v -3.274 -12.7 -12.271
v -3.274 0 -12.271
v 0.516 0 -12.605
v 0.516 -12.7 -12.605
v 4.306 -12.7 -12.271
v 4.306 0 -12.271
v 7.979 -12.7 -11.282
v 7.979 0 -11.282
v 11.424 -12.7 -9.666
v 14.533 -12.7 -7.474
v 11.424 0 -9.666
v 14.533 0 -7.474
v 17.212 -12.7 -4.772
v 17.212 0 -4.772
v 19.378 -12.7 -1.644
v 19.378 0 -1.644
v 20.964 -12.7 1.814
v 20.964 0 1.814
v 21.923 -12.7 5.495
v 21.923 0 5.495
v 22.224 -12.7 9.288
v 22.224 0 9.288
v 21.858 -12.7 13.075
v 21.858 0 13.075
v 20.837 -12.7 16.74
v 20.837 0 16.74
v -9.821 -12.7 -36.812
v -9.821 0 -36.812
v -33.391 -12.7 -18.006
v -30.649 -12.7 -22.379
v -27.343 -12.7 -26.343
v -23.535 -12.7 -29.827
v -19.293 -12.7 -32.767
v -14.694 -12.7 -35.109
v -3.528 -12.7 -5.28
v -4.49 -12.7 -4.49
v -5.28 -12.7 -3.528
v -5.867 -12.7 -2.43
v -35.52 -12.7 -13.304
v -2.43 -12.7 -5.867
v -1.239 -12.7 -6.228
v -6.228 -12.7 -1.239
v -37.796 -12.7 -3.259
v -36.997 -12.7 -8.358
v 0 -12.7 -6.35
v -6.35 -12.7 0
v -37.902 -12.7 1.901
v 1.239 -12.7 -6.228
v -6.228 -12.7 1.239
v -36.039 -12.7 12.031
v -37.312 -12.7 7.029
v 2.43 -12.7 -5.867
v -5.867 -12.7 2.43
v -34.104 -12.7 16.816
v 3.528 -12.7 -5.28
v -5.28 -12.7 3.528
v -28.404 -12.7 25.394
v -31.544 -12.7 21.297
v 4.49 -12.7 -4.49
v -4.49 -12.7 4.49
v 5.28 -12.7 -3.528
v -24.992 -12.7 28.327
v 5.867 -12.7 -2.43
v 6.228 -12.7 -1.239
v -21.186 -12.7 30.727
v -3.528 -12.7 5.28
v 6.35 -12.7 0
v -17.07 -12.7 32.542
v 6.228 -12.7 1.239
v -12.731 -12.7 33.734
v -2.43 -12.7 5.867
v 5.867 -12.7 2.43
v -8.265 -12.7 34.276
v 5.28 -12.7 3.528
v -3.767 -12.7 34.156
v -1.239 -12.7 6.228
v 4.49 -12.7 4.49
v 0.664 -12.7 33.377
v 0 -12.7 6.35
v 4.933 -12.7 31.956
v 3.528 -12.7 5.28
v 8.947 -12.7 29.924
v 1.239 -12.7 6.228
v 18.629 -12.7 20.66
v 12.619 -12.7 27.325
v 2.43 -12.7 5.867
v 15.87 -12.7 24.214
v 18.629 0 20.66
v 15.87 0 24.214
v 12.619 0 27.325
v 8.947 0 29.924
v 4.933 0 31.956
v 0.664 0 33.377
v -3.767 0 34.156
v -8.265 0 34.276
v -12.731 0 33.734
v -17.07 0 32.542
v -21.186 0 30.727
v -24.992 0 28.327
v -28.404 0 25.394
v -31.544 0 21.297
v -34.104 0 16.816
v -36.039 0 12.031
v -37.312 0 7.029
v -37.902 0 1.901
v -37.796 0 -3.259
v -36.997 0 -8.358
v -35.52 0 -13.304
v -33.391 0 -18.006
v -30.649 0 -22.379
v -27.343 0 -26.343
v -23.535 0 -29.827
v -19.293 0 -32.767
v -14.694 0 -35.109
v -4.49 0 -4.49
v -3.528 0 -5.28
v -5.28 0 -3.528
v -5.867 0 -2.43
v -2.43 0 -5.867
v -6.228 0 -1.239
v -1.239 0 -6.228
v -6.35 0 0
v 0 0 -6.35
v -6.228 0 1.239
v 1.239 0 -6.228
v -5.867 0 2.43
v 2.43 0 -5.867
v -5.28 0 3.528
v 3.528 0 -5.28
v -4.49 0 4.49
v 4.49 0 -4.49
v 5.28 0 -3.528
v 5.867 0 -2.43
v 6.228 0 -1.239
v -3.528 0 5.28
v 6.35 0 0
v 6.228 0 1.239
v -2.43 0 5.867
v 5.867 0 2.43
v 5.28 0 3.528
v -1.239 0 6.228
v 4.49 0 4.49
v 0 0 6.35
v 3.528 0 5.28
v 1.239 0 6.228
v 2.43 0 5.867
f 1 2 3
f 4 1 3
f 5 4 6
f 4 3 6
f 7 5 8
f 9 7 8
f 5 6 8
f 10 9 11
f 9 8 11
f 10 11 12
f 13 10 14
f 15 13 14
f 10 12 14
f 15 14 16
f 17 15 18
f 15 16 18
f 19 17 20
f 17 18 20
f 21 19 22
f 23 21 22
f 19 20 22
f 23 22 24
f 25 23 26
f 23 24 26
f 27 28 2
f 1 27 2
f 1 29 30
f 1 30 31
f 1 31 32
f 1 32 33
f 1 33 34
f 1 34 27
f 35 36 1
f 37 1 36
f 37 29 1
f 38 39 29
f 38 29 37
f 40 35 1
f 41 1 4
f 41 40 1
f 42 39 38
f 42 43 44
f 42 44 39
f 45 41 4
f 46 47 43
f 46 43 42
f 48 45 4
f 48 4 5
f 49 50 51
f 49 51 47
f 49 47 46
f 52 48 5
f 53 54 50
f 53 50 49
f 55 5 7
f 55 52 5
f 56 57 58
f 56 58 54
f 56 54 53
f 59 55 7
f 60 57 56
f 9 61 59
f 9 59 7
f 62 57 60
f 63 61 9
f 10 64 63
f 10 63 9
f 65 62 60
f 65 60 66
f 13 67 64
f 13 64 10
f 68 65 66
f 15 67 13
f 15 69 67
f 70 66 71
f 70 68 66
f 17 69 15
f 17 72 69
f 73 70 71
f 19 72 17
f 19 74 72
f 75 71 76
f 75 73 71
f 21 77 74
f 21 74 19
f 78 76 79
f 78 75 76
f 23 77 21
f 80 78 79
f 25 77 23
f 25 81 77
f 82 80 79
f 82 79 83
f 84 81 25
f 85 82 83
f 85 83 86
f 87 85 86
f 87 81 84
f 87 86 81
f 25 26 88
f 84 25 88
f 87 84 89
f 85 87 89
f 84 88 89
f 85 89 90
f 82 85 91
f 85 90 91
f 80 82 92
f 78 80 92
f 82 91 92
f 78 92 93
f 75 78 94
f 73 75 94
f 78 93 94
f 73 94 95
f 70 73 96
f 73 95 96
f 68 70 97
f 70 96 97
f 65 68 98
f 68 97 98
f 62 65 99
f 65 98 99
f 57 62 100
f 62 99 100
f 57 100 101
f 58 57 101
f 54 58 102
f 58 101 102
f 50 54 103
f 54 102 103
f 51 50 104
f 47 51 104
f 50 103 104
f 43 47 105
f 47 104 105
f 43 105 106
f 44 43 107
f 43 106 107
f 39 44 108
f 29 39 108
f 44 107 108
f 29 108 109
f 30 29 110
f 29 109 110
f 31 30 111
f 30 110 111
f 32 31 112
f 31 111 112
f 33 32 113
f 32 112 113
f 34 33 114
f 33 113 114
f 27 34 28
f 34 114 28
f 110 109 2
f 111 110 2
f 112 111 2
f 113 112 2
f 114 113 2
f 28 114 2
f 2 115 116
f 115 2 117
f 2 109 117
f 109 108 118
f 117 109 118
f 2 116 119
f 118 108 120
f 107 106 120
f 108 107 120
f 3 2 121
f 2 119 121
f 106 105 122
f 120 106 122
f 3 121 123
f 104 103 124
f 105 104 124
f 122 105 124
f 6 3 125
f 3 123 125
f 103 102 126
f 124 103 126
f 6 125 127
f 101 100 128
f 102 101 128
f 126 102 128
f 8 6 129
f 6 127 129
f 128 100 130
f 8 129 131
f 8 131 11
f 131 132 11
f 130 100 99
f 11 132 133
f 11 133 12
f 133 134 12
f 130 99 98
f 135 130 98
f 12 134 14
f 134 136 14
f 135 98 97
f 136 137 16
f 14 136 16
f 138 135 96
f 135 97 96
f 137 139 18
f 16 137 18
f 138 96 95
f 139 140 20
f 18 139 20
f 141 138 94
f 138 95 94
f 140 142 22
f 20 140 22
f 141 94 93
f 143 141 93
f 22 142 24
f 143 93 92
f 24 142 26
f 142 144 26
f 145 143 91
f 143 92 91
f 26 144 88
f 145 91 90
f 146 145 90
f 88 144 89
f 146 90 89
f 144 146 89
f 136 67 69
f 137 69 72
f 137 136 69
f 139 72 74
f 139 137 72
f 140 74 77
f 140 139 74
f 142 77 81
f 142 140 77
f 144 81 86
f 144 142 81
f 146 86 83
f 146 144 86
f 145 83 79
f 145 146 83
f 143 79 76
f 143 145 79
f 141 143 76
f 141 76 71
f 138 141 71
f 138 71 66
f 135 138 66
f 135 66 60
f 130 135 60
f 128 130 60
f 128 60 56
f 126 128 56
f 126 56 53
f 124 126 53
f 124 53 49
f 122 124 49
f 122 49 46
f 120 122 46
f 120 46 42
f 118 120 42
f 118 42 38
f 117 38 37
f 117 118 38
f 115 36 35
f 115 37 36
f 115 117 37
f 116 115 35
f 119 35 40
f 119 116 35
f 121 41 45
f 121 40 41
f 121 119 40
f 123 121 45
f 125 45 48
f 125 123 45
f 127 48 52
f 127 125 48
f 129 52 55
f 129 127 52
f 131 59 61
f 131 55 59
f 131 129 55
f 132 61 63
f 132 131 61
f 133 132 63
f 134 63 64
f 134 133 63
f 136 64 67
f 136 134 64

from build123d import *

# Parameters (mm, degrees)
F2_DEPTH = 12.7
F1_R     = 6.35
F3_DEPTH = 25.4


with BuildPart() as f2:
    # F0 (on Front) → F2 (new body)
    with BuildSketch(Plane.XZ):
        with BuildLine():
            ThreePointArc((-28.403627, 25.393778), (-36.341802, -10.856114), (-9.82124, -36.812406))
            Line((-9.82124, -36.812406), (-3.273747, -12.270802))
            ThreePointArc((-3.273747, -12.270802), (17.211851, -4.772017), (20.836528, 16.739681))
            ThreePointArc((20.836528, 16.739681), (-1.537184, 33.848118), (-28.403627, 25.393778))
        make_face()
    extrude(amount=F2_DEPTH)

    # F1 (on face) → F3 (cut)
    with BuildSketch(Plane.XZ):
        Circle(F1_R)
    extrude(amount=F3_DEPTH, mode=Mode.SUBTRACT)


solid = f2.part
